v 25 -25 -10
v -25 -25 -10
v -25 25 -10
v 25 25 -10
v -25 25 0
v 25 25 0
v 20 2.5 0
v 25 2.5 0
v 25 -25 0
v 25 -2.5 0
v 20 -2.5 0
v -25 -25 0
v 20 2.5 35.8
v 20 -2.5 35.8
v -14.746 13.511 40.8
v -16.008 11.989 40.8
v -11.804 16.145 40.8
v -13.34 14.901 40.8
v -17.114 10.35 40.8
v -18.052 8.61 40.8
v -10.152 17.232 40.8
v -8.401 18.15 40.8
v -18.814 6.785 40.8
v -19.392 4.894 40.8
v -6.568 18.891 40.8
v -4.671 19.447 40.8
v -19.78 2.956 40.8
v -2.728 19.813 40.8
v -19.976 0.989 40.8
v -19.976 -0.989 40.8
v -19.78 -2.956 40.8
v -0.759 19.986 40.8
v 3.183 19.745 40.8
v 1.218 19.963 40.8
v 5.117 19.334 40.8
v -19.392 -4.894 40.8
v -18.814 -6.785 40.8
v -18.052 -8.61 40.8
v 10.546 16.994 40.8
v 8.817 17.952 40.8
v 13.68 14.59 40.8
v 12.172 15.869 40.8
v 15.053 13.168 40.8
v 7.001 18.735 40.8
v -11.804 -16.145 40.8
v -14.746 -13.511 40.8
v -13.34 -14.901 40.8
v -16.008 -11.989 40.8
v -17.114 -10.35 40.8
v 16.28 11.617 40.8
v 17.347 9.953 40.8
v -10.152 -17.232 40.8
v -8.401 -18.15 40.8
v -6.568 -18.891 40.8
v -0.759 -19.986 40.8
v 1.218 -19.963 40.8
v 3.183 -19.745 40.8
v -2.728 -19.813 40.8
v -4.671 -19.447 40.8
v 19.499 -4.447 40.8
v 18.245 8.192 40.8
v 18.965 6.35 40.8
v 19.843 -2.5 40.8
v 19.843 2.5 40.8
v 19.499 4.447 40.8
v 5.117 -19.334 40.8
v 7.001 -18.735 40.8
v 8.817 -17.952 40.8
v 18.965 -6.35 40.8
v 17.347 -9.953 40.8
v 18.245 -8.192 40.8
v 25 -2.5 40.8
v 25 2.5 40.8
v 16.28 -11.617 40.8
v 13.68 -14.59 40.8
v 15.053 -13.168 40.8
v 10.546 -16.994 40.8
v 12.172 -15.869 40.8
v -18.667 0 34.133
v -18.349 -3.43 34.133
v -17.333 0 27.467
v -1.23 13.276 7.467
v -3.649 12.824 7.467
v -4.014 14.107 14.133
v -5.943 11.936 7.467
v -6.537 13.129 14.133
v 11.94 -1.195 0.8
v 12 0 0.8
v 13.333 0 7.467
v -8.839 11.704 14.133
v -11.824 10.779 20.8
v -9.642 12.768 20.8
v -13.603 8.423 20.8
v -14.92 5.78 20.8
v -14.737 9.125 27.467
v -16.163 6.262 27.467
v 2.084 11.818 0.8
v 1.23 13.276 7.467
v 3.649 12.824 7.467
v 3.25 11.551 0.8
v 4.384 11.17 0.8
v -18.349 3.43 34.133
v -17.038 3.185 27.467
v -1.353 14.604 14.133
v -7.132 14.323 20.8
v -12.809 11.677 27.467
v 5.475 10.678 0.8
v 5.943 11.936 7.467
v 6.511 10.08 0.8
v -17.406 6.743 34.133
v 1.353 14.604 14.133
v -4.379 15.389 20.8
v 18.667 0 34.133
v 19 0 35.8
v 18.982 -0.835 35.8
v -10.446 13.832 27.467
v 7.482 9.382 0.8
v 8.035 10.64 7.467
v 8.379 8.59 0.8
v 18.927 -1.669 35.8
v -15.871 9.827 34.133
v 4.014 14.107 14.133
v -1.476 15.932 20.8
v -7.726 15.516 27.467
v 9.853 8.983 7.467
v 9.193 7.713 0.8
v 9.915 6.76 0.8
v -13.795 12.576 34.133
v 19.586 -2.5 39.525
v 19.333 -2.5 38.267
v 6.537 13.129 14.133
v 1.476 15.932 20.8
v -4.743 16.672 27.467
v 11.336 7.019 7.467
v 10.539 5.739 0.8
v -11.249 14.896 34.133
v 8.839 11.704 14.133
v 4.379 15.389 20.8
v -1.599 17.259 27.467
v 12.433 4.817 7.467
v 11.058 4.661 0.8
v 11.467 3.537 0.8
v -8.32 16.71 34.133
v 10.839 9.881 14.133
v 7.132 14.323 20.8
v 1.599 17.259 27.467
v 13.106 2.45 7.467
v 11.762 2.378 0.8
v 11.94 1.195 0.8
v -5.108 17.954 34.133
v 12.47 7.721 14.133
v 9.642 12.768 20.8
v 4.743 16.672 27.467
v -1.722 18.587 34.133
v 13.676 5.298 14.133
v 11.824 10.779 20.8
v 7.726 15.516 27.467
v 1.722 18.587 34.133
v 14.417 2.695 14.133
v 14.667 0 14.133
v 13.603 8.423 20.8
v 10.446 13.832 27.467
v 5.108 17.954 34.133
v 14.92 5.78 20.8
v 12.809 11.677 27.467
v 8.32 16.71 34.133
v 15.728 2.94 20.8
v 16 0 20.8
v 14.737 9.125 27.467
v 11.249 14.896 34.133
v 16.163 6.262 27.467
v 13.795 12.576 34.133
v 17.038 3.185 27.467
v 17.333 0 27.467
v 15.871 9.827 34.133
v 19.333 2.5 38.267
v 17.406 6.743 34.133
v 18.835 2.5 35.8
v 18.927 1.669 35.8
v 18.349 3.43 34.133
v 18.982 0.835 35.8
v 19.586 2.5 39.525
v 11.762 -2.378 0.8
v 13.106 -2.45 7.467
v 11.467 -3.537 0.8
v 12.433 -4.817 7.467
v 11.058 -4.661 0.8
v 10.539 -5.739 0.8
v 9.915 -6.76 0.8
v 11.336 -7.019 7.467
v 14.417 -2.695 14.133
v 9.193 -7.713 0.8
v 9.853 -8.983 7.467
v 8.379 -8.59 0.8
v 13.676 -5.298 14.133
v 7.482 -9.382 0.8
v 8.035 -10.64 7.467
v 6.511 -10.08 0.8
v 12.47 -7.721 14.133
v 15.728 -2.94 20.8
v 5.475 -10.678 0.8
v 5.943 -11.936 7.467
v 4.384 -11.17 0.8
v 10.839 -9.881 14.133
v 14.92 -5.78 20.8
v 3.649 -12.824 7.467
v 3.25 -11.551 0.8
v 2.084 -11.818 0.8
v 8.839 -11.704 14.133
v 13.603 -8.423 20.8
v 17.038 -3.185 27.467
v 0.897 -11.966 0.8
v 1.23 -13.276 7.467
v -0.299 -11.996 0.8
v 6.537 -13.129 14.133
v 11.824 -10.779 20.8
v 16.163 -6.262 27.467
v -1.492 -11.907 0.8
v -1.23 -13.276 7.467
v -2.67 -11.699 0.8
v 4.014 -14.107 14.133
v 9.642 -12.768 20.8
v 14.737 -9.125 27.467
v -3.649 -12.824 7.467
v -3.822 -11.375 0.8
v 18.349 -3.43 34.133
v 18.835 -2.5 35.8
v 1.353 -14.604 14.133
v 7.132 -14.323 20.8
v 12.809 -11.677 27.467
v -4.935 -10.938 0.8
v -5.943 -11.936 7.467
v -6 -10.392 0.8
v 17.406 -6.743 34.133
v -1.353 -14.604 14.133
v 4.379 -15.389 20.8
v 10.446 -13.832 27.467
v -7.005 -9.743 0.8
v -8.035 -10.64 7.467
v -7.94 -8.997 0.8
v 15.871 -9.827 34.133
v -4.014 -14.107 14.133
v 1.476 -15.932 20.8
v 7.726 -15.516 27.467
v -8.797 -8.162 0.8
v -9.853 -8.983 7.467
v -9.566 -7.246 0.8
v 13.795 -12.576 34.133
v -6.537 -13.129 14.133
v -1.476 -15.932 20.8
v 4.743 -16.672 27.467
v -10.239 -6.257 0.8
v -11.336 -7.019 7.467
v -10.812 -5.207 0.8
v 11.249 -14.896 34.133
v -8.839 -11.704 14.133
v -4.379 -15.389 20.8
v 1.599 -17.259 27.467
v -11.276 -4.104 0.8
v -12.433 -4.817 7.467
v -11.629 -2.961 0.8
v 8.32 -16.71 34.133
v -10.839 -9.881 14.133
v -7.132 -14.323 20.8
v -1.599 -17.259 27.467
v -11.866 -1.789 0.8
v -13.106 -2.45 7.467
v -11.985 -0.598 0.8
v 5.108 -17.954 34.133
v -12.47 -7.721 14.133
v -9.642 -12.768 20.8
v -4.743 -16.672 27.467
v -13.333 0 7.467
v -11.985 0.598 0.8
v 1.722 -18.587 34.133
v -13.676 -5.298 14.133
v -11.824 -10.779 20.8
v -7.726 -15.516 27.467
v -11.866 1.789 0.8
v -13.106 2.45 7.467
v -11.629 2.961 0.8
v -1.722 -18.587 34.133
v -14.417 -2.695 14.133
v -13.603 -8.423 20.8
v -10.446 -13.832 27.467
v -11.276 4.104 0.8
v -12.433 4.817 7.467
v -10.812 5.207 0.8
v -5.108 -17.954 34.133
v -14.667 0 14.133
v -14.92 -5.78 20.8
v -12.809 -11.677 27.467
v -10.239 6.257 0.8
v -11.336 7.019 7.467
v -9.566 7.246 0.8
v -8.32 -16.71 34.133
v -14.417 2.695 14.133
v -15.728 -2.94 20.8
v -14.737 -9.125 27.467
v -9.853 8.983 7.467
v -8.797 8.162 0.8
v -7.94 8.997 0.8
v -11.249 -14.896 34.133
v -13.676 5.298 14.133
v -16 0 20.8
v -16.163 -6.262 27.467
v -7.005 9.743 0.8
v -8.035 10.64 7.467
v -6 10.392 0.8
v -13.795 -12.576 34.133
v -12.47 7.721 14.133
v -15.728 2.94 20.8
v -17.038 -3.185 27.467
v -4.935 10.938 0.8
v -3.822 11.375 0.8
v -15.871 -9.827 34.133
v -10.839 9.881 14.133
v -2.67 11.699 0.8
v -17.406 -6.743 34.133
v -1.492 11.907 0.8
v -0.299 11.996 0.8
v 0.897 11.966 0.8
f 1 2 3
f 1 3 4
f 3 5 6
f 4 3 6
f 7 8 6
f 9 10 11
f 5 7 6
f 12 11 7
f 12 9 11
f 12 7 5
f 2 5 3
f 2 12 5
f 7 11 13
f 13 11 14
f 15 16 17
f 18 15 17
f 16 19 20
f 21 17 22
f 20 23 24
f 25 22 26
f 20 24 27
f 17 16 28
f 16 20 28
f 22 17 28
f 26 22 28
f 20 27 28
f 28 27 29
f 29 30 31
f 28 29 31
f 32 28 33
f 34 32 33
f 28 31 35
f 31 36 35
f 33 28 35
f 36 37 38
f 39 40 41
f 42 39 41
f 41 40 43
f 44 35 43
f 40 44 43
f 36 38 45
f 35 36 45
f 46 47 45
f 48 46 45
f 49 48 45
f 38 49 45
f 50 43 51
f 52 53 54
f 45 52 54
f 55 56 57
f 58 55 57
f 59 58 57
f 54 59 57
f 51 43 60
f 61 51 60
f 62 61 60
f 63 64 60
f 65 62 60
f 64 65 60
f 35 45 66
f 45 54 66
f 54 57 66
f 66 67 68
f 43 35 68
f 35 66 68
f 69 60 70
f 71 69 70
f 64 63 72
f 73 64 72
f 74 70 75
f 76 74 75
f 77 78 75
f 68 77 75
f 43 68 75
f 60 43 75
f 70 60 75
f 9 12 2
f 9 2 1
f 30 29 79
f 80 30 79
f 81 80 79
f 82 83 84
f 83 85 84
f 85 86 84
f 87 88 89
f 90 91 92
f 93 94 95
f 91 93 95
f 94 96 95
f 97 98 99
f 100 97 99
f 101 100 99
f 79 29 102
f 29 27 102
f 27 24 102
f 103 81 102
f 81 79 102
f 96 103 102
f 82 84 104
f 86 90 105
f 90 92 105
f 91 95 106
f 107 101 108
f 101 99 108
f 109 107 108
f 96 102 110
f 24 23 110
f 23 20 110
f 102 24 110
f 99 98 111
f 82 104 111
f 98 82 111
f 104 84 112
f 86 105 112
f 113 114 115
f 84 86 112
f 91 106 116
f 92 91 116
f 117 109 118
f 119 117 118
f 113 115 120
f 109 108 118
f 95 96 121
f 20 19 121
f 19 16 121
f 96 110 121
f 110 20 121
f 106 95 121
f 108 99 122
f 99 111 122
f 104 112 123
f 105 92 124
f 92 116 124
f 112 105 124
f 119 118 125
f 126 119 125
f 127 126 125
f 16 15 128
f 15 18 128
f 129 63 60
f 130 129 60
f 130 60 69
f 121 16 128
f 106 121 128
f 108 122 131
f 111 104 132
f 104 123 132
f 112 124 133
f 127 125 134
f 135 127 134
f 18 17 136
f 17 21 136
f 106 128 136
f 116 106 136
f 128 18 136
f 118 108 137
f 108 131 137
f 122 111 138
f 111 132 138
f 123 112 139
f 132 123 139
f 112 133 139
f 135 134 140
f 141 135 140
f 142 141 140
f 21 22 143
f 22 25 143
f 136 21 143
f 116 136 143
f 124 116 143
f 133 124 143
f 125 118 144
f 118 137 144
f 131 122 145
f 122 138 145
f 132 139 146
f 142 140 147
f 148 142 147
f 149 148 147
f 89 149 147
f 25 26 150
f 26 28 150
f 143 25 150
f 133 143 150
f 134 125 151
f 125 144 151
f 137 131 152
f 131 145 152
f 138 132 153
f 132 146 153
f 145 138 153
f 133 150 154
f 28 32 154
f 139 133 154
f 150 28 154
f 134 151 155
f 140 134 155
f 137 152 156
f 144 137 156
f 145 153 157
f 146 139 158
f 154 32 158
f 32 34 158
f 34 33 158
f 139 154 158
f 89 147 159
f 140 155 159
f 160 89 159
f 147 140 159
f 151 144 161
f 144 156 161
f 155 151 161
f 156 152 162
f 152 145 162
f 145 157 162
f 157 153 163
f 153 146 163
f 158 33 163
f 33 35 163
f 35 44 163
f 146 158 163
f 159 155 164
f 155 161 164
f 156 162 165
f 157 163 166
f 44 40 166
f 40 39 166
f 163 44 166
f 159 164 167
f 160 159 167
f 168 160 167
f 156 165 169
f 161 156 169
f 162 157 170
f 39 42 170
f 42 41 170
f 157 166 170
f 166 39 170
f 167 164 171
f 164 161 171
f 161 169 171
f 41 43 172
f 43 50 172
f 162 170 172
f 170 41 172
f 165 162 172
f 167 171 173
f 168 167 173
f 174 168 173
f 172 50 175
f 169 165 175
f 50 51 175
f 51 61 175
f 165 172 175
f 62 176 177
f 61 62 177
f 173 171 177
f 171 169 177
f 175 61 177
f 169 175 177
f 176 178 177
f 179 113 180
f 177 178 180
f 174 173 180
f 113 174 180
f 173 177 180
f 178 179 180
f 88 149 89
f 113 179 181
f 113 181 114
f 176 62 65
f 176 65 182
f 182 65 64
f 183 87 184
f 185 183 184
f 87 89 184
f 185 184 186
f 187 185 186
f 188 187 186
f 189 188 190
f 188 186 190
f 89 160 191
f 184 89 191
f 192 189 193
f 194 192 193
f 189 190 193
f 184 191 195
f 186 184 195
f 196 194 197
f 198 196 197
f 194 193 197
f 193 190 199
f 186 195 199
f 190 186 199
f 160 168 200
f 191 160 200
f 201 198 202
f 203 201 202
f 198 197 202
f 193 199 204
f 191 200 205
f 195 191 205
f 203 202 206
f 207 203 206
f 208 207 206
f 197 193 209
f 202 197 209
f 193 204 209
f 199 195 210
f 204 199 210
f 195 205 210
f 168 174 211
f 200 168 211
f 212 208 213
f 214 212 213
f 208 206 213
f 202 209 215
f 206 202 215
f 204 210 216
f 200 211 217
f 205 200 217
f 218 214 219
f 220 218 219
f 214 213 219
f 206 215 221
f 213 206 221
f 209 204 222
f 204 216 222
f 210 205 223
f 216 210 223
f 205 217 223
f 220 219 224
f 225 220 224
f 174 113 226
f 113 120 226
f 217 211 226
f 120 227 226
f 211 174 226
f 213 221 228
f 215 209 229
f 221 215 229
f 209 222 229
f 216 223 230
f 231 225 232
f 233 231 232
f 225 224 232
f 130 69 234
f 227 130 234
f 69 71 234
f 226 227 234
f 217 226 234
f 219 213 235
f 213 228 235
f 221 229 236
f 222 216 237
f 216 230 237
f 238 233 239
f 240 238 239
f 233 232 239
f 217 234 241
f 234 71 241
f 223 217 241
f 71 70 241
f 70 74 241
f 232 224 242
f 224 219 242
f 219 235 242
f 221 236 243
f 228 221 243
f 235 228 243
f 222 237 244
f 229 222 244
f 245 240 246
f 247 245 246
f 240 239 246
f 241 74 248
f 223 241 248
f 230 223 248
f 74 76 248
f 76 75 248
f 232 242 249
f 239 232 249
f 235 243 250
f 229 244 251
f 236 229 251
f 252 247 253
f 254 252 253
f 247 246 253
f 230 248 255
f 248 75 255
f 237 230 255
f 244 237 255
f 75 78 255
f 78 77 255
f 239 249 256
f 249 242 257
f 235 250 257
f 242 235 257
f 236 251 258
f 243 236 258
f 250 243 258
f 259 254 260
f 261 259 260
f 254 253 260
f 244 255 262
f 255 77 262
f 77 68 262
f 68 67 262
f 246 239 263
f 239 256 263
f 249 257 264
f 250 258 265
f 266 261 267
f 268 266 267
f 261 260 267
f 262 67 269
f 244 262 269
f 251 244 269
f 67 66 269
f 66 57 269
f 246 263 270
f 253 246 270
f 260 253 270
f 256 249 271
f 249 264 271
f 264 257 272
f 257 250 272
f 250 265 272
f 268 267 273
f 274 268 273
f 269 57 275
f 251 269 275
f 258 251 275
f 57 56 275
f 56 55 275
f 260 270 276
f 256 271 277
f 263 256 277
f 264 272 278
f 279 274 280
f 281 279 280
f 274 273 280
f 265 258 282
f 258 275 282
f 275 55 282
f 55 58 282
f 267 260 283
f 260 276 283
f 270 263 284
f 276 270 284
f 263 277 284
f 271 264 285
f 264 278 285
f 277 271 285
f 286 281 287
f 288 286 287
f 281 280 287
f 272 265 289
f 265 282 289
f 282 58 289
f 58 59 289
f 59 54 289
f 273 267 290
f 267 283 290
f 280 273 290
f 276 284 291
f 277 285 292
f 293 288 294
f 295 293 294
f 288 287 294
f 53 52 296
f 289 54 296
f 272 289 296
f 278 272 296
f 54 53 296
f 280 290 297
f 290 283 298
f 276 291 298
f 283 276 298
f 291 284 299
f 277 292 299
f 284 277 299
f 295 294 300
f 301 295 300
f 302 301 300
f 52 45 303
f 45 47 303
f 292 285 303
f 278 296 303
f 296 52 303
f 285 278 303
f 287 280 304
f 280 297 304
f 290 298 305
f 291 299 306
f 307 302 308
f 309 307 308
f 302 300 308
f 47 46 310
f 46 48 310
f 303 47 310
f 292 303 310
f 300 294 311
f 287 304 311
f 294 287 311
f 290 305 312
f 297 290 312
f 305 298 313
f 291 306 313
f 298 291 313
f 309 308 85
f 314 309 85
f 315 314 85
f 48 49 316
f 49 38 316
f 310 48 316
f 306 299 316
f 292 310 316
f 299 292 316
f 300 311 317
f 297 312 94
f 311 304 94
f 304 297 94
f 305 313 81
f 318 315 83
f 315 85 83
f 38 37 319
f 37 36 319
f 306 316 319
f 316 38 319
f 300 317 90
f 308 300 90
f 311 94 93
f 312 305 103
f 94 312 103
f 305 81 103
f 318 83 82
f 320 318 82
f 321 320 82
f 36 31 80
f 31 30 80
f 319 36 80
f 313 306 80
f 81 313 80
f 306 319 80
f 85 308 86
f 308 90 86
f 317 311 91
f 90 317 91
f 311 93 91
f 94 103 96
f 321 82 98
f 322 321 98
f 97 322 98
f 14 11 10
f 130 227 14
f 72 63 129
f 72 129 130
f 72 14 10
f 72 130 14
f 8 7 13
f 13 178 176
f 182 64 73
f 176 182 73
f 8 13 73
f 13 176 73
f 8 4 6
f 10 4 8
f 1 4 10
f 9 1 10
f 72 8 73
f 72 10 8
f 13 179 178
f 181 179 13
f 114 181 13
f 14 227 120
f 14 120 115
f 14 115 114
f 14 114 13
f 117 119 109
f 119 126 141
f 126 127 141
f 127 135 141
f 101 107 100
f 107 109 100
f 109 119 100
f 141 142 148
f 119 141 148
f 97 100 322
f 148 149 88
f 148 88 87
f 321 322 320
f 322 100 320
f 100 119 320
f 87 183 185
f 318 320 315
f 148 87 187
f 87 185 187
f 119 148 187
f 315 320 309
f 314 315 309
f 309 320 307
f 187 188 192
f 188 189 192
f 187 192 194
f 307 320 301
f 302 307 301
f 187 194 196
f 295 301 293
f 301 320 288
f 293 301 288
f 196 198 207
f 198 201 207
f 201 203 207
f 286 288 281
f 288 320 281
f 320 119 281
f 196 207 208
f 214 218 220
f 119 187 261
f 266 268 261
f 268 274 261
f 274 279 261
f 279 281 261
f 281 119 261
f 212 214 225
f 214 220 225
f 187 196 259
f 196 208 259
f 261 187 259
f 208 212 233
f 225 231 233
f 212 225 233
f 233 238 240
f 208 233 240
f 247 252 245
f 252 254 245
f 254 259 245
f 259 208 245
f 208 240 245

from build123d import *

# Parameters (mm, degrees)
F1_DEPTH = 25
F0_W     = 5
F0_H     = 35.8
F2_DEPTH = 2.5


with BuildPart() as f1:
    # F0 (on Front) → F1 (new body, symmetric)
    with BuildSketch(Plane.XZ):
        Polygon((20, 0), (-25, 0), (-25, -10), (25, -10), (25, 0), align=None)
    extrude(amount=F1_DEPTH, both=True)

    # F0 (on Front) → F2 (join, symmetric)
    with BuildSketch(Plane.XZ):
        with Locations((22.5, 17.9)):
            Rectangle(F0_W, F0_H)
        Polygon((19, 35.8), (20, 35.8), (25, 35.8), (25, 40.8), (20, 40.8), align=None)
        Polygon((0, 35.8), (19, 35.8), (20, 40.8), (0, 40.8), align=None)
    extrude(amount=F2_DEPTH, both=True)

    # F0 (on Front) → F3 (revolve)
    with BuildSketch(Plane.XZ):
        Polygon((12, 0.8), (19, 35.8), (0, 35.8), (0, 0.8), align=None)
        Polygon((0, 35.8), (19, 35.8), (20, 40.8), (0, 40.8), align=None)
    revolve(axis=Axis((0, 0, 20.8), (0, 0, -1)))


solid = f1.part
